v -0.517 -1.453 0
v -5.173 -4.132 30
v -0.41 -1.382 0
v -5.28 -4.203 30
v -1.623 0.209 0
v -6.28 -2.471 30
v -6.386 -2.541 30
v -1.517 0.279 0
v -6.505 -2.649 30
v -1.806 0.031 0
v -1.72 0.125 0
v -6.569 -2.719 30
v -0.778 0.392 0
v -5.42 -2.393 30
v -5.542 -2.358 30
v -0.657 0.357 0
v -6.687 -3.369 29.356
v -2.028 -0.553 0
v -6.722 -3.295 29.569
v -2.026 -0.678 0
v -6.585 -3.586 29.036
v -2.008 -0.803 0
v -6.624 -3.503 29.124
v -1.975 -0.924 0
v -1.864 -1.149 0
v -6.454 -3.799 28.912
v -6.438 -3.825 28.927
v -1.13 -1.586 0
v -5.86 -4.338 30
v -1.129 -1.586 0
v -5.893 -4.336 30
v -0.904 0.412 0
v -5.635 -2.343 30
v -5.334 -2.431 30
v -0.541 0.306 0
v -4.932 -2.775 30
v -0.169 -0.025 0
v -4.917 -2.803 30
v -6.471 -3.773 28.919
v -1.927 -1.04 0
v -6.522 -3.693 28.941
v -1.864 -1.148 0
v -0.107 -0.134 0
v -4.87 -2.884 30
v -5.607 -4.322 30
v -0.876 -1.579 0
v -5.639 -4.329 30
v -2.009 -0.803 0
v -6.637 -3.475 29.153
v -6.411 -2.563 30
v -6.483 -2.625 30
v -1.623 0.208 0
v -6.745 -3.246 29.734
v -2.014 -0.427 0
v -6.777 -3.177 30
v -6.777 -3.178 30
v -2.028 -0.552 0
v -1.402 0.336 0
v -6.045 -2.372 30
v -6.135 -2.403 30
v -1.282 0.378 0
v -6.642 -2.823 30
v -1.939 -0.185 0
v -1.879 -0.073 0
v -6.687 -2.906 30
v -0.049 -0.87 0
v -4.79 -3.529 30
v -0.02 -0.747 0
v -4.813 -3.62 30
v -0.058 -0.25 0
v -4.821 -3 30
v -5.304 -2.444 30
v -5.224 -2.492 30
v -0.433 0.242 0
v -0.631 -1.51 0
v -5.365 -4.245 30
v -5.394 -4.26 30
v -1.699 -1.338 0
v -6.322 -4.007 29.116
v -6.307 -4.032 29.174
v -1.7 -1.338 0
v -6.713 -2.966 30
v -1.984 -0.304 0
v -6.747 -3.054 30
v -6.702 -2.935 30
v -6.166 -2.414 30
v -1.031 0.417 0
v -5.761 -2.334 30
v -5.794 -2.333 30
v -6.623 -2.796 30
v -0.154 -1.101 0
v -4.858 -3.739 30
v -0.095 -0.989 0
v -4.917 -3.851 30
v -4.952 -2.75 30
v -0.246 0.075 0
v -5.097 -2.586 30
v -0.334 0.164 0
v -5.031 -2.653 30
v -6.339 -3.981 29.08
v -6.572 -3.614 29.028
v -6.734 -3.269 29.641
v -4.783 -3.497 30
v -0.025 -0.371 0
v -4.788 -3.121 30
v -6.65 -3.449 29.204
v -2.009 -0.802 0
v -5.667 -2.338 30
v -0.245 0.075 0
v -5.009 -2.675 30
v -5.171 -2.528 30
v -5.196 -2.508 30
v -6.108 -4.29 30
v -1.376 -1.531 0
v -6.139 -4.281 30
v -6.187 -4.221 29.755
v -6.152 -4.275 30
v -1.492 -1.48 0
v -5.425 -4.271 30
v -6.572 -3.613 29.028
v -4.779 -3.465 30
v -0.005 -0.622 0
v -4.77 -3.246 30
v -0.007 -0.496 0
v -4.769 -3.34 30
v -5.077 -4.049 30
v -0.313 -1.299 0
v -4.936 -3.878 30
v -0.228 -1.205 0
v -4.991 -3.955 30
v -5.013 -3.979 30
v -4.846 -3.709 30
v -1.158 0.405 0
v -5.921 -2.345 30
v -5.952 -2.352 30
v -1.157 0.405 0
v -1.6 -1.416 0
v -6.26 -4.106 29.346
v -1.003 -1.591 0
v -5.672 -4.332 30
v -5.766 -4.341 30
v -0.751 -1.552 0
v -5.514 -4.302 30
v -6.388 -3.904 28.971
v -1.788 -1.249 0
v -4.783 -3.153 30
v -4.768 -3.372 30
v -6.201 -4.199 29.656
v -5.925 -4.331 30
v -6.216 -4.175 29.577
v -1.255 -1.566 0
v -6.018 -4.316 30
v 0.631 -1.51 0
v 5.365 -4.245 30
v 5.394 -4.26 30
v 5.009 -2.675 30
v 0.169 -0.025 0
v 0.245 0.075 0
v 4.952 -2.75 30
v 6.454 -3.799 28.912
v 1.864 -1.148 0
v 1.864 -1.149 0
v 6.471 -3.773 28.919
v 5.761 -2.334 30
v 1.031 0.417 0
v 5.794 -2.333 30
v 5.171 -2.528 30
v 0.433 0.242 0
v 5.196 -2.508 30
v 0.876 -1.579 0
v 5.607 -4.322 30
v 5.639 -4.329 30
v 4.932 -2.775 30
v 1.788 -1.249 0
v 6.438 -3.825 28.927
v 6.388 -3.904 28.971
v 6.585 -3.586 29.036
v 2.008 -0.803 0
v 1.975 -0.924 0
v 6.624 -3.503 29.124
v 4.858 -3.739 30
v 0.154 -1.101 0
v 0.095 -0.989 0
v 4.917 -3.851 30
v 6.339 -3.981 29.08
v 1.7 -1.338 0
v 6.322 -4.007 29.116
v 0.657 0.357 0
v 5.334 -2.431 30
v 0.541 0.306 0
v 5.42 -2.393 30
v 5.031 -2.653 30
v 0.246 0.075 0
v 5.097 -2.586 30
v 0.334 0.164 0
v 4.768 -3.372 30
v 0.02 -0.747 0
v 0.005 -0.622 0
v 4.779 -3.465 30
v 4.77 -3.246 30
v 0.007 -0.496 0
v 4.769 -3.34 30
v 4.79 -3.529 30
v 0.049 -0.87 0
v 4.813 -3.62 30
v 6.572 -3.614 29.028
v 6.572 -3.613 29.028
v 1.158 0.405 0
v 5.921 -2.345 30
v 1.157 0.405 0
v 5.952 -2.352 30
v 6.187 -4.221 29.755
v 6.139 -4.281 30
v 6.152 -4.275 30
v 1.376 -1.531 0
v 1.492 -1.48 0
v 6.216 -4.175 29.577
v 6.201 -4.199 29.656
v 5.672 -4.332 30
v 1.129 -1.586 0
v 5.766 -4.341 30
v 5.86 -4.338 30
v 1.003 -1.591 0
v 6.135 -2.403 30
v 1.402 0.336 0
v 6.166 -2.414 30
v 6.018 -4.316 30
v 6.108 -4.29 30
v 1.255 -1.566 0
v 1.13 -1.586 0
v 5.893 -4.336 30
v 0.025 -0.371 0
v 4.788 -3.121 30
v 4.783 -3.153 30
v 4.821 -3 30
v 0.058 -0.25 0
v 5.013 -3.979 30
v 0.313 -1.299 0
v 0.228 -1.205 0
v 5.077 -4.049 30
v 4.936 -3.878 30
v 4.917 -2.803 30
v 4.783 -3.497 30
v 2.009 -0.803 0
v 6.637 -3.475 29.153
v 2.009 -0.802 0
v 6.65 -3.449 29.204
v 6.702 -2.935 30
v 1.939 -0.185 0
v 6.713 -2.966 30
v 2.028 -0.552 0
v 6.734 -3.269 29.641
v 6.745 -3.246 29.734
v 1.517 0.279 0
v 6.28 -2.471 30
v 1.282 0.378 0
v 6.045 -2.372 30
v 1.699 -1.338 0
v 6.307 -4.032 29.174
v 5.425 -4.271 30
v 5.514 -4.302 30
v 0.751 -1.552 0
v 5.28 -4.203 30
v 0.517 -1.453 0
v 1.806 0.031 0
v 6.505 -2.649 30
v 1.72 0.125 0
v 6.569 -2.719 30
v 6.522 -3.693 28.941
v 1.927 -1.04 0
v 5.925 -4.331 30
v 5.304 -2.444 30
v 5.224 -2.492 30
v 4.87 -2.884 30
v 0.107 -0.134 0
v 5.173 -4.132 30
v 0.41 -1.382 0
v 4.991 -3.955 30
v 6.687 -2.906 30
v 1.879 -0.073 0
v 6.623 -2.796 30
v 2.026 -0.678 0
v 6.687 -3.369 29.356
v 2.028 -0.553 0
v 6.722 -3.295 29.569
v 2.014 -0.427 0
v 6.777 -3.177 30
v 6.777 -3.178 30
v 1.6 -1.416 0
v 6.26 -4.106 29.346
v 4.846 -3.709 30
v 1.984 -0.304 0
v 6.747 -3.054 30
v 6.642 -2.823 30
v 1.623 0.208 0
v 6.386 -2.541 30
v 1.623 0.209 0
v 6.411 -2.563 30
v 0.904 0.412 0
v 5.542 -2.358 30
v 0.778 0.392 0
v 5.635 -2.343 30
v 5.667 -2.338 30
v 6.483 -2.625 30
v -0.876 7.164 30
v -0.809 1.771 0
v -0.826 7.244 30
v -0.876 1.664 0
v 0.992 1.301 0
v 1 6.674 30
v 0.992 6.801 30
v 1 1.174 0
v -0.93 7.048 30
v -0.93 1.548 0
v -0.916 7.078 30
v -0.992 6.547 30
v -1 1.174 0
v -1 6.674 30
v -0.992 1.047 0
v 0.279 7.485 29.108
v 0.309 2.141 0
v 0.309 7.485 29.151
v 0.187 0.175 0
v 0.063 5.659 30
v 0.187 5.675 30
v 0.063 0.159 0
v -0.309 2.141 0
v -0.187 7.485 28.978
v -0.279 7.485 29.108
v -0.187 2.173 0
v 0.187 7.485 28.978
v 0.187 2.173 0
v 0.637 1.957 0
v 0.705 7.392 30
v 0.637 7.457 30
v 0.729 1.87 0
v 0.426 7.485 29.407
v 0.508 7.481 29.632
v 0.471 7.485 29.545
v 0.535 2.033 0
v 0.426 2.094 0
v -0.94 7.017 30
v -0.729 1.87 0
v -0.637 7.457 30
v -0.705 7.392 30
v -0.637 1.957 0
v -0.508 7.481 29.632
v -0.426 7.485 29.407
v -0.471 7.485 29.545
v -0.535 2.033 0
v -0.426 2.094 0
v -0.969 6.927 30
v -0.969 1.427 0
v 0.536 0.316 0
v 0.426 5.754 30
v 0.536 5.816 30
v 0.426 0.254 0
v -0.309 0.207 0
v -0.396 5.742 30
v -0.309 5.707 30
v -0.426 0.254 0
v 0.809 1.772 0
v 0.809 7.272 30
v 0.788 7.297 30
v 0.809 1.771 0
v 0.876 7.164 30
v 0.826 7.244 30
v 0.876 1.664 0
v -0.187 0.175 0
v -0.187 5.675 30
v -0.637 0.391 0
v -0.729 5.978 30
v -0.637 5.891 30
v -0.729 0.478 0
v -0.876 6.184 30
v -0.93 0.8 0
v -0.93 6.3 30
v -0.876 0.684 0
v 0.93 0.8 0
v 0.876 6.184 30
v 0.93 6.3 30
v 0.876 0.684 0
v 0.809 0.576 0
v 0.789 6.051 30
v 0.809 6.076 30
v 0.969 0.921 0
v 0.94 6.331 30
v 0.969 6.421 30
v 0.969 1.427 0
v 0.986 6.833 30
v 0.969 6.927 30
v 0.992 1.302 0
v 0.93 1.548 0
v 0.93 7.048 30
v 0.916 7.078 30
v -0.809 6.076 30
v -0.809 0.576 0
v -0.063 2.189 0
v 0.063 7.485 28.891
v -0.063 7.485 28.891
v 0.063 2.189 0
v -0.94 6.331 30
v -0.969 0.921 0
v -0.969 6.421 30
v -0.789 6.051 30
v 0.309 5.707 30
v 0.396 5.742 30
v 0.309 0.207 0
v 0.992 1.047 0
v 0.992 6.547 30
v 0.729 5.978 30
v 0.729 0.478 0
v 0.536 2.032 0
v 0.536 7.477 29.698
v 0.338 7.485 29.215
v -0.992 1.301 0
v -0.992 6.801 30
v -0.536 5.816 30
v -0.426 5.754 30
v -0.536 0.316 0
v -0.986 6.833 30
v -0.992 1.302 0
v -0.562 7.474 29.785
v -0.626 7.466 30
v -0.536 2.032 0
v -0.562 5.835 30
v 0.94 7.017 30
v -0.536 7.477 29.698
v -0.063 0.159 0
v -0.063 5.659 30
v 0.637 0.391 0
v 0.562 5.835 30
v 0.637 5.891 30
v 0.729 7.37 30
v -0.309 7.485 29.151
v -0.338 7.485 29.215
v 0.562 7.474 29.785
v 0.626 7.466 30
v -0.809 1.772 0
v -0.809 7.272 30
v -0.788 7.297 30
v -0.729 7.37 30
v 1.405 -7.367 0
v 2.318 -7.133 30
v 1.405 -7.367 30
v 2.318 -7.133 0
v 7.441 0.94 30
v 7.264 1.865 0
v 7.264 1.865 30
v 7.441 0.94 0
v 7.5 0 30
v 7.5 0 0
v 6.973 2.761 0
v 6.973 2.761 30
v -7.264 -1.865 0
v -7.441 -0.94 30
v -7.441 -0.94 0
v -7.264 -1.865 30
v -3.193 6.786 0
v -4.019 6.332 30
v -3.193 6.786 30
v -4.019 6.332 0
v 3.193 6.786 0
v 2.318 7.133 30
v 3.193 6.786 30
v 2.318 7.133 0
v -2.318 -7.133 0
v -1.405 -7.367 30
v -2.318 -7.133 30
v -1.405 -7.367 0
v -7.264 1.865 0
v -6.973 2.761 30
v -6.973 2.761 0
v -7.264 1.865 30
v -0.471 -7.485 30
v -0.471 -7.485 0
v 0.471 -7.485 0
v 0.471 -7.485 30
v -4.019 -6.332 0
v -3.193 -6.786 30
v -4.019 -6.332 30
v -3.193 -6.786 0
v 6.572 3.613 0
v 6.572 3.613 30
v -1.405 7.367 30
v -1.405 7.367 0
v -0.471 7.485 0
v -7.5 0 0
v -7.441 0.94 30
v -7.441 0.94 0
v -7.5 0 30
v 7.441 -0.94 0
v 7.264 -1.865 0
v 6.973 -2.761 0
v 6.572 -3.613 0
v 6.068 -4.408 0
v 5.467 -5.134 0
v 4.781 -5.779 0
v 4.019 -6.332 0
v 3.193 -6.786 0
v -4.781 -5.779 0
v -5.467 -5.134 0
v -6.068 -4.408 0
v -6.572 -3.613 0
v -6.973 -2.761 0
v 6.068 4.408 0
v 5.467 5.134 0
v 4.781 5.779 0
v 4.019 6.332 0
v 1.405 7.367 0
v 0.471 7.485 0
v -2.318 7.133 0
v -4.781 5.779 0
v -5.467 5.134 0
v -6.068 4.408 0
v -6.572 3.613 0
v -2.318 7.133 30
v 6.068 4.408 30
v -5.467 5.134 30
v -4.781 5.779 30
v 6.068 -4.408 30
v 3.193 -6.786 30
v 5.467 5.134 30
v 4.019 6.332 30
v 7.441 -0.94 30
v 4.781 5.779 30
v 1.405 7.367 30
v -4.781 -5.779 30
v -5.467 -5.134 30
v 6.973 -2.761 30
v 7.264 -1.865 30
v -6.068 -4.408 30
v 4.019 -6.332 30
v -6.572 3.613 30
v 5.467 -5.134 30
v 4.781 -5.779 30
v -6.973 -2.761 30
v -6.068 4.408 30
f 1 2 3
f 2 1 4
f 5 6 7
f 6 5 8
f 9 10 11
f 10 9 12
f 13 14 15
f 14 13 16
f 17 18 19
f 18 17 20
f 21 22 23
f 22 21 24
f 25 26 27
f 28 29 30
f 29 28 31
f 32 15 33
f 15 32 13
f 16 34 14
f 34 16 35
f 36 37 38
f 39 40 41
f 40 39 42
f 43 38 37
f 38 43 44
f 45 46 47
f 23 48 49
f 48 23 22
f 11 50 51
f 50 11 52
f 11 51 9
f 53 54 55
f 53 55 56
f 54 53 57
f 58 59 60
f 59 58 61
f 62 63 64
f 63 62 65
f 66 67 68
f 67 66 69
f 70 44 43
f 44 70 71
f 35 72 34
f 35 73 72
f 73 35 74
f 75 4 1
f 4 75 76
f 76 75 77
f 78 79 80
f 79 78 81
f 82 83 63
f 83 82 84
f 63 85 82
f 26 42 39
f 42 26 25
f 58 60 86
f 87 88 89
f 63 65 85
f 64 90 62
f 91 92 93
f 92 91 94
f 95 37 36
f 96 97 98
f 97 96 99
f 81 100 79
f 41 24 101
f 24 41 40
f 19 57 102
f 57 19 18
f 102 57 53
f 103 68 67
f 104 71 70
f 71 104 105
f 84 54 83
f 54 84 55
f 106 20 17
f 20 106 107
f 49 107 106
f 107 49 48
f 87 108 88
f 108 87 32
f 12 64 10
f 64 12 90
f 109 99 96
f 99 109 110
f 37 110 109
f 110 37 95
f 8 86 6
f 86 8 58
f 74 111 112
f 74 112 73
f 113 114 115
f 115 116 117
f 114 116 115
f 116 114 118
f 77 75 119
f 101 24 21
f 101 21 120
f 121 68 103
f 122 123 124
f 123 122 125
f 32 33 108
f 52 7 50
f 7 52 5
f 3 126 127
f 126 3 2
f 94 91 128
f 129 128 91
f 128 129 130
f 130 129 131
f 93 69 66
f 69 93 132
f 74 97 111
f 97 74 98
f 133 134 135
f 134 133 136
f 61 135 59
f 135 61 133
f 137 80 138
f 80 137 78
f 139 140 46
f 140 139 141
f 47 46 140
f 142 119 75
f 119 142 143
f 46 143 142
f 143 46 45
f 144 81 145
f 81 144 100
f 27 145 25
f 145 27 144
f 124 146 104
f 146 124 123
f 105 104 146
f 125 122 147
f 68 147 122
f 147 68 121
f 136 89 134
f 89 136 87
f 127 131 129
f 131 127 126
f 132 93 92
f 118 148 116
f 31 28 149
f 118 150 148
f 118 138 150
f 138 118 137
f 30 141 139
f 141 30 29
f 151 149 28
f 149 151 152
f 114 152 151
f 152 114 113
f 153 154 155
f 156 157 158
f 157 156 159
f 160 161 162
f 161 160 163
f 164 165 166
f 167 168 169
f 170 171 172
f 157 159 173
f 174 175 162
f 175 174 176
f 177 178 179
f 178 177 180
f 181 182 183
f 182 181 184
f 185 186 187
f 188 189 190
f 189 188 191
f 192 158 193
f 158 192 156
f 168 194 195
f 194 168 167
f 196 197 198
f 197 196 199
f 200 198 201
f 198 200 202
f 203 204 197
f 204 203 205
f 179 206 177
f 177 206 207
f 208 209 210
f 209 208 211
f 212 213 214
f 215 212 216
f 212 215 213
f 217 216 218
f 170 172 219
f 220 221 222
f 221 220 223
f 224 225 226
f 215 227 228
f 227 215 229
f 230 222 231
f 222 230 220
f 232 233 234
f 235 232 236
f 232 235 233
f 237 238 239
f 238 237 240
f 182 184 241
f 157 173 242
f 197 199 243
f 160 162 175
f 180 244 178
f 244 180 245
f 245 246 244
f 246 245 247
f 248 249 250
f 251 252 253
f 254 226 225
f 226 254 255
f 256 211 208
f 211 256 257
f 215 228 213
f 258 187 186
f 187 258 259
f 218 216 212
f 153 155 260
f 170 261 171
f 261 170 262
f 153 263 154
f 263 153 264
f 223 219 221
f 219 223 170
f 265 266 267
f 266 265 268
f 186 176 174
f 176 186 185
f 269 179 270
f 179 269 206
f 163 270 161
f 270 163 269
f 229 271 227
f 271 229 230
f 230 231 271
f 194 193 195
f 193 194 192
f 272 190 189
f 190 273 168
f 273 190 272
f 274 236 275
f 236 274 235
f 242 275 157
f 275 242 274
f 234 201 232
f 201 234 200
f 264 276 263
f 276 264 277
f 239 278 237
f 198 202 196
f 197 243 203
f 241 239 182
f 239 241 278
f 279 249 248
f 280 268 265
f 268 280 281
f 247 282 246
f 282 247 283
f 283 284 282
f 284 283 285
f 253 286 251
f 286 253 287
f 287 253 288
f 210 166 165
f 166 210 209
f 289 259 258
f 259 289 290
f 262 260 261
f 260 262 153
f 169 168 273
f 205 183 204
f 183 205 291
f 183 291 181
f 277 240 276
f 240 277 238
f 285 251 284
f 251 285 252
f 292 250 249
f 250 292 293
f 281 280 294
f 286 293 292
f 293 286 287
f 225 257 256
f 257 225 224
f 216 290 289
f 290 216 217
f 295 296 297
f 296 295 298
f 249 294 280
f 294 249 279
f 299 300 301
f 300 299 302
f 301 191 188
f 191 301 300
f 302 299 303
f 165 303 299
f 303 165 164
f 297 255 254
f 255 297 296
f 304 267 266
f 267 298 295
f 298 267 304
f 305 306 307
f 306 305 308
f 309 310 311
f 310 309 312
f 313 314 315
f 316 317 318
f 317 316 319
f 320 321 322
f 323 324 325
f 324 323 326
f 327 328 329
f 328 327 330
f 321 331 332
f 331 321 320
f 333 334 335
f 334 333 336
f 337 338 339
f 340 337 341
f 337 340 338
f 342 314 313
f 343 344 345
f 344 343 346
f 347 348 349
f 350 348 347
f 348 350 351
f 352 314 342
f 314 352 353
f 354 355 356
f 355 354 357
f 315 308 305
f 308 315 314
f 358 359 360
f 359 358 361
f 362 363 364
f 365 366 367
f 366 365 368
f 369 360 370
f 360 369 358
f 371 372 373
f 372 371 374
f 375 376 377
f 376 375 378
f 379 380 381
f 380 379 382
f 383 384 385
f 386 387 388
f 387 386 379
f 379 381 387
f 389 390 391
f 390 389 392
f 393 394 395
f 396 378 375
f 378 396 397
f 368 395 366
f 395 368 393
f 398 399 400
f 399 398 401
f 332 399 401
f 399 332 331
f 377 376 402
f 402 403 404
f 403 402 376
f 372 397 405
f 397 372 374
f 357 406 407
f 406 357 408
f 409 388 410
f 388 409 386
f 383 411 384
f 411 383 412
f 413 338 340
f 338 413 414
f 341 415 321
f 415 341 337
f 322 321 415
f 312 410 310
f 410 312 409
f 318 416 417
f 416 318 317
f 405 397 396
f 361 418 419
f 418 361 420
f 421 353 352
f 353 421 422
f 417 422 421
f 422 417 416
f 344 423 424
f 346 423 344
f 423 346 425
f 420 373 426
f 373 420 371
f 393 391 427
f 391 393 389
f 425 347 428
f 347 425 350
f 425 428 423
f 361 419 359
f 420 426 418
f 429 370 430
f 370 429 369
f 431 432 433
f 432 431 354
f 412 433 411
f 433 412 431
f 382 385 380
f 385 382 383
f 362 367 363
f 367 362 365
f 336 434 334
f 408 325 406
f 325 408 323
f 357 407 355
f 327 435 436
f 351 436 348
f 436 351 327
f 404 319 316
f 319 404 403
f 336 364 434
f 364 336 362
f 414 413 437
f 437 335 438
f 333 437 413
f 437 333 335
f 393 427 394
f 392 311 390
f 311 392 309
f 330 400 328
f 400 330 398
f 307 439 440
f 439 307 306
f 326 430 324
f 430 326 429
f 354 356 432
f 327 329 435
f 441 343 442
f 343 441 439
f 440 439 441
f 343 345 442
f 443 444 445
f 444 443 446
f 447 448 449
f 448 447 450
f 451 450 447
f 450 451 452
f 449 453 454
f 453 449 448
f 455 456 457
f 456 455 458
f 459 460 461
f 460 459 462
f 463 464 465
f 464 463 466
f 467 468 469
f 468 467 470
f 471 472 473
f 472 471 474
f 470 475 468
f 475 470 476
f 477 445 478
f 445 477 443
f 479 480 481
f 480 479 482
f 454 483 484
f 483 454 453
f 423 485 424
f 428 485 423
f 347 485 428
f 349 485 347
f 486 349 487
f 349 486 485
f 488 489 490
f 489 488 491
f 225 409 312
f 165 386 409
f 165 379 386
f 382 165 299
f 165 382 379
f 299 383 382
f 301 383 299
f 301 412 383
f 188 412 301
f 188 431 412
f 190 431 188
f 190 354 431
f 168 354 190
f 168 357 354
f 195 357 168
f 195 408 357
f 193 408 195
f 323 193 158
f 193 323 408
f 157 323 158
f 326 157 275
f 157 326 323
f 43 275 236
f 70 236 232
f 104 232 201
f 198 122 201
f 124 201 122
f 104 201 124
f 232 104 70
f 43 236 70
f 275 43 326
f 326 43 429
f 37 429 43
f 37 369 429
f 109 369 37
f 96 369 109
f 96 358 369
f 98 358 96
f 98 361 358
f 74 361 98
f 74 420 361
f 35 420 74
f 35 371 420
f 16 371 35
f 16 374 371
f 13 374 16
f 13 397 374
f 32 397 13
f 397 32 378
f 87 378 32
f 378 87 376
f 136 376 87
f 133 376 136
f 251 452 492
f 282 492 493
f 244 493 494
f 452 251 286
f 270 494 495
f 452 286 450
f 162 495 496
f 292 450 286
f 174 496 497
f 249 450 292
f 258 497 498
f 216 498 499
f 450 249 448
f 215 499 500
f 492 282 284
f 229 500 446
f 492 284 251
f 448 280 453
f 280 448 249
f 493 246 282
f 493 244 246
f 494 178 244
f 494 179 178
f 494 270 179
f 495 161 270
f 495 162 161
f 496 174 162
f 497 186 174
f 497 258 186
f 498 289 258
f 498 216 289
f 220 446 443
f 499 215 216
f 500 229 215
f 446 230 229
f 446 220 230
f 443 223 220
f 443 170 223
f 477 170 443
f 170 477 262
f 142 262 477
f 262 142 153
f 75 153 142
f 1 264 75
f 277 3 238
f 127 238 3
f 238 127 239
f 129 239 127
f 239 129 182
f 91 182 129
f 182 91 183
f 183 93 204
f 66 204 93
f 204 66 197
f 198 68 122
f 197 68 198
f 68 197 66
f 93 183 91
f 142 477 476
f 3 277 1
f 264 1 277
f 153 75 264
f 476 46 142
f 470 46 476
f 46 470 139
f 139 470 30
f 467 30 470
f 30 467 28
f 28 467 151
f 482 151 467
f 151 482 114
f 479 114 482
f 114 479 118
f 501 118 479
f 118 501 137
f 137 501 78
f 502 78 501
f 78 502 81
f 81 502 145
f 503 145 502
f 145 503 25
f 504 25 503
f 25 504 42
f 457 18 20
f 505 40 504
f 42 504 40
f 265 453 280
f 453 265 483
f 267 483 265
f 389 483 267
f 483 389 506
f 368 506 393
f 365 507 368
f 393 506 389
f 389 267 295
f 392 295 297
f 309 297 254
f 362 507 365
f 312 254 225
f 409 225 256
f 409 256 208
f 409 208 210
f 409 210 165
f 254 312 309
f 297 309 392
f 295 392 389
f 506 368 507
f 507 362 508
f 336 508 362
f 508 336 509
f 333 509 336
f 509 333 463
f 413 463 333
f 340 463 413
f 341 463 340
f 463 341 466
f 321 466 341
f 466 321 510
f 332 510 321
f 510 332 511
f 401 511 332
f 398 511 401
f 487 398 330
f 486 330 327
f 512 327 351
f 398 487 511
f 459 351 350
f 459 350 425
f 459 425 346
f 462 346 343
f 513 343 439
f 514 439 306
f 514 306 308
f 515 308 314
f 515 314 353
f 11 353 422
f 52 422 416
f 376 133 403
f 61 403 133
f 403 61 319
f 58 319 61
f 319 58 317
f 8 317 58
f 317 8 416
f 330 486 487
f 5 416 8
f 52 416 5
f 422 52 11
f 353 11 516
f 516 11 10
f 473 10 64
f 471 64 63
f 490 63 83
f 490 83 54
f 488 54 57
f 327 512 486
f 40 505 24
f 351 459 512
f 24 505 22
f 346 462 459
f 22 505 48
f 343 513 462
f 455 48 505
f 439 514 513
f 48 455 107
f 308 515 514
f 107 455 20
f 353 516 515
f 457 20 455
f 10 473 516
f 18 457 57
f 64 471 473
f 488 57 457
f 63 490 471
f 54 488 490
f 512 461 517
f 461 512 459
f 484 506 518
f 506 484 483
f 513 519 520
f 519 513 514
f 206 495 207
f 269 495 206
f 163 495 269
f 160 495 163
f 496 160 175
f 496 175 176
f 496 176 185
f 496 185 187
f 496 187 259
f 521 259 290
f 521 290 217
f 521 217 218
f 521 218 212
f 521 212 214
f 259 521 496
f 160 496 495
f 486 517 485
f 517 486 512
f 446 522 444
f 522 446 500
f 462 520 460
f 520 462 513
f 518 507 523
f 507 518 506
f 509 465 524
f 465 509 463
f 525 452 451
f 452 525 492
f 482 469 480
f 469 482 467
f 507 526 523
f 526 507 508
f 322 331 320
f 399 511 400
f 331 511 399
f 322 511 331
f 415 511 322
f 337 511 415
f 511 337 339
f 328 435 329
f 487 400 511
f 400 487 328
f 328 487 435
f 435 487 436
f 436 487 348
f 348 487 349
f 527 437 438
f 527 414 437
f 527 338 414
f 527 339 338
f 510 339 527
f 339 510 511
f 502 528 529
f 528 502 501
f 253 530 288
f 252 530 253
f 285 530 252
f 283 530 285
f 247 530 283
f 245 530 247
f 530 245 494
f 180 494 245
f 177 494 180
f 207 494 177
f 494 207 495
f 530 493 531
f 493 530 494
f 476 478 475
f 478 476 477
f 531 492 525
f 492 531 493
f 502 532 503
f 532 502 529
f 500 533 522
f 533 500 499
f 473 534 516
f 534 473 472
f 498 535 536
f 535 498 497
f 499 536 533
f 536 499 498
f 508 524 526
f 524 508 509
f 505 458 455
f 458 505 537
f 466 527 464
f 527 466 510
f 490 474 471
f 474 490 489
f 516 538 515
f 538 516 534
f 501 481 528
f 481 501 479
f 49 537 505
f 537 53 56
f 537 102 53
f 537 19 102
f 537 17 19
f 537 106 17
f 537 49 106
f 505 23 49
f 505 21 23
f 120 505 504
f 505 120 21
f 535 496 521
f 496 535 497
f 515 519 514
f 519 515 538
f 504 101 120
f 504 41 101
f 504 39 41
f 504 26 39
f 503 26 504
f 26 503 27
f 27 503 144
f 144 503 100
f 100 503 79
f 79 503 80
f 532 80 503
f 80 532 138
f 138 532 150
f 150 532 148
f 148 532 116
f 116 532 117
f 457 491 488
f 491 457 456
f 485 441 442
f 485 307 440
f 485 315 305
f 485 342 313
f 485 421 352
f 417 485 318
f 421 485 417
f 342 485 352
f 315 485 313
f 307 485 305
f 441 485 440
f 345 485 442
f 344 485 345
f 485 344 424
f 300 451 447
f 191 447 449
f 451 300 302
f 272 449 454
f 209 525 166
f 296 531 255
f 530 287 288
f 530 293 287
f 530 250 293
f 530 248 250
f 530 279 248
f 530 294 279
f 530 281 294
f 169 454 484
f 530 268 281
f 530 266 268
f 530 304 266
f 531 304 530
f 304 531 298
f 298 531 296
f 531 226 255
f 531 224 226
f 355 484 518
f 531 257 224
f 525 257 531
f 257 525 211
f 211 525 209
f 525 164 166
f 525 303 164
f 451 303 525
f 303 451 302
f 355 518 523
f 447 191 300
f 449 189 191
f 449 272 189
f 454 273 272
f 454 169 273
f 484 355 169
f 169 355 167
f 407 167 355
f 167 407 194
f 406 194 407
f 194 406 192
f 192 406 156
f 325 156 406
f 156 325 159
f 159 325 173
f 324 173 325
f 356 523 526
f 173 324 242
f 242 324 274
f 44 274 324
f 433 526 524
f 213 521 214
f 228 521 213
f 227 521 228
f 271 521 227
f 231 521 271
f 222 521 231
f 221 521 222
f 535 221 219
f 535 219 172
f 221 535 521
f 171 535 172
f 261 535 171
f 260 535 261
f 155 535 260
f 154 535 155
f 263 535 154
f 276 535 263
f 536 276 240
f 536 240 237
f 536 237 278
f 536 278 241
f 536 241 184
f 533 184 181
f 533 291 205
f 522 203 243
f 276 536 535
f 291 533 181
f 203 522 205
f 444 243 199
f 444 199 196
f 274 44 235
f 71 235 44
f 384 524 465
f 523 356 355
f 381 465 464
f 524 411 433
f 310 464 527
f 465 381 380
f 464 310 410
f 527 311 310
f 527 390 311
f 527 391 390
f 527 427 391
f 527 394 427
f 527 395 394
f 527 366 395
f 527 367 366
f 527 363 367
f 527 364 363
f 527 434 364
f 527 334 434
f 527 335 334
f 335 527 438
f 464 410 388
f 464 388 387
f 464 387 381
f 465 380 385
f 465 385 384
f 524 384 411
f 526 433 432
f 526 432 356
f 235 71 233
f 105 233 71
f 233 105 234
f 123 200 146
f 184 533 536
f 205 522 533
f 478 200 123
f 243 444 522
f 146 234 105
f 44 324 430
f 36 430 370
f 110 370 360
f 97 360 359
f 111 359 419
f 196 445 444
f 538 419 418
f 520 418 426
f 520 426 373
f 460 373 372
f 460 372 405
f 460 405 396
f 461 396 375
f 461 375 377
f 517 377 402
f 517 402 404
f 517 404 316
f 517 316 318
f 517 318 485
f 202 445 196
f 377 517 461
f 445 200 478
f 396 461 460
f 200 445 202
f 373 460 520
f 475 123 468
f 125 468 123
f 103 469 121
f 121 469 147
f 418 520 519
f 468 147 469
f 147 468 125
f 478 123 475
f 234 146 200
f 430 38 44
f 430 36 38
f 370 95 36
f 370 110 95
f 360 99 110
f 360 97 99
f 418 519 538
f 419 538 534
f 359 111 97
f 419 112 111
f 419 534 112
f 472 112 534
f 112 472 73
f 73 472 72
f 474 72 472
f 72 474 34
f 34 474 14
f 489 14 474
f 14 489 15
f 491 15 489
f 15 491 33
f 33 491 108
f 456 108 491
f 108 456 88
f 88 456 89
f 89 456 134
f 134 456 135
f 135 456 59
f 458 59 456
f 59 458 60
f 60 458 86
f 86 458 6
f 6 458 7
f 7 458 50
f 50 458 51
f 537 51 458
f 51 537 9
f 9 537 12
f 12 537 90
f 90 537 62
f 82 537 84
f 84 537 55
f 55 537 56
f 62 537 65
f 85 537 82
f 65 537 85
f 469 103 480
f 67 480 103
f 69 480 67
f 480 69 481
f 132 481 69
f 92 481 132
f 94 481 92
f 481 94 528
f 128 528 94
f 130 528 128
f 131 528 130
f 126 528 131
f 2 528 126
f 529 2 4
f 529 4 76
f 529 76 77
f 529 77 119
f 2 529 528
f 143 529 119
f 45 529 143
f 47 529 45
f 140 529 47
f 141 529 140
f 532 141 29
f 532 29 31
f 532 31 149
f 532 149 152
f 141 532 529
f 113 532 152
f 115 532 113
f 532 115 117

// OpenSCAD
// [FL_INDEX: keywords="openscad, 3d_parametric, Customizable_Twisted_Wire_Jig, csg_solid" | COT="Parametric OpenSCAD design from 3DCodeverse"]
// Title: Customizable Twisted Wire Jig

// preview[view:north, tilt:top]

center = 0; //[0:No Center, 1:Center]
wireRad = 1;
jigRad = 7.5;
jigHeight=30;
numStrand = 3; //[3:20]
// Smoothness of the stl
$fn=50;

difference()
{
	cylinder(h=jigHeight, r=jigRad);

	union()
	{
		for (i=[1:1:numStrand])
		{
			if (center)
			{
				rotate([-atan((jigRad-(wireRad/(sin(180/numStrand))+wireRad*(1-cos(180/numStrand))))/jigHeight),0,i*360/numStrand])
				translate([0,wireRad/(sin(180/numStrand))+wireRad*(1-cos(180/numStrand)),0])
				cylinder(h=jigHeight*4, r=wireRad, center=false);
			}
			else
			{
				rotate([-atan((jigRad-(wireRad/(cos(180/numStrand))))/jigHeight),0,i*360/numStrand])
				translate([0,wireRad/(sin(180/numStrand)),0])
				cylinder(h=jigHeight*4, r=wireRad, center=false);
			}
		}
		if (center)
		{
			cylinder(h=jigHeight*4, r=wireRad, center=true);
		}
	}
}
